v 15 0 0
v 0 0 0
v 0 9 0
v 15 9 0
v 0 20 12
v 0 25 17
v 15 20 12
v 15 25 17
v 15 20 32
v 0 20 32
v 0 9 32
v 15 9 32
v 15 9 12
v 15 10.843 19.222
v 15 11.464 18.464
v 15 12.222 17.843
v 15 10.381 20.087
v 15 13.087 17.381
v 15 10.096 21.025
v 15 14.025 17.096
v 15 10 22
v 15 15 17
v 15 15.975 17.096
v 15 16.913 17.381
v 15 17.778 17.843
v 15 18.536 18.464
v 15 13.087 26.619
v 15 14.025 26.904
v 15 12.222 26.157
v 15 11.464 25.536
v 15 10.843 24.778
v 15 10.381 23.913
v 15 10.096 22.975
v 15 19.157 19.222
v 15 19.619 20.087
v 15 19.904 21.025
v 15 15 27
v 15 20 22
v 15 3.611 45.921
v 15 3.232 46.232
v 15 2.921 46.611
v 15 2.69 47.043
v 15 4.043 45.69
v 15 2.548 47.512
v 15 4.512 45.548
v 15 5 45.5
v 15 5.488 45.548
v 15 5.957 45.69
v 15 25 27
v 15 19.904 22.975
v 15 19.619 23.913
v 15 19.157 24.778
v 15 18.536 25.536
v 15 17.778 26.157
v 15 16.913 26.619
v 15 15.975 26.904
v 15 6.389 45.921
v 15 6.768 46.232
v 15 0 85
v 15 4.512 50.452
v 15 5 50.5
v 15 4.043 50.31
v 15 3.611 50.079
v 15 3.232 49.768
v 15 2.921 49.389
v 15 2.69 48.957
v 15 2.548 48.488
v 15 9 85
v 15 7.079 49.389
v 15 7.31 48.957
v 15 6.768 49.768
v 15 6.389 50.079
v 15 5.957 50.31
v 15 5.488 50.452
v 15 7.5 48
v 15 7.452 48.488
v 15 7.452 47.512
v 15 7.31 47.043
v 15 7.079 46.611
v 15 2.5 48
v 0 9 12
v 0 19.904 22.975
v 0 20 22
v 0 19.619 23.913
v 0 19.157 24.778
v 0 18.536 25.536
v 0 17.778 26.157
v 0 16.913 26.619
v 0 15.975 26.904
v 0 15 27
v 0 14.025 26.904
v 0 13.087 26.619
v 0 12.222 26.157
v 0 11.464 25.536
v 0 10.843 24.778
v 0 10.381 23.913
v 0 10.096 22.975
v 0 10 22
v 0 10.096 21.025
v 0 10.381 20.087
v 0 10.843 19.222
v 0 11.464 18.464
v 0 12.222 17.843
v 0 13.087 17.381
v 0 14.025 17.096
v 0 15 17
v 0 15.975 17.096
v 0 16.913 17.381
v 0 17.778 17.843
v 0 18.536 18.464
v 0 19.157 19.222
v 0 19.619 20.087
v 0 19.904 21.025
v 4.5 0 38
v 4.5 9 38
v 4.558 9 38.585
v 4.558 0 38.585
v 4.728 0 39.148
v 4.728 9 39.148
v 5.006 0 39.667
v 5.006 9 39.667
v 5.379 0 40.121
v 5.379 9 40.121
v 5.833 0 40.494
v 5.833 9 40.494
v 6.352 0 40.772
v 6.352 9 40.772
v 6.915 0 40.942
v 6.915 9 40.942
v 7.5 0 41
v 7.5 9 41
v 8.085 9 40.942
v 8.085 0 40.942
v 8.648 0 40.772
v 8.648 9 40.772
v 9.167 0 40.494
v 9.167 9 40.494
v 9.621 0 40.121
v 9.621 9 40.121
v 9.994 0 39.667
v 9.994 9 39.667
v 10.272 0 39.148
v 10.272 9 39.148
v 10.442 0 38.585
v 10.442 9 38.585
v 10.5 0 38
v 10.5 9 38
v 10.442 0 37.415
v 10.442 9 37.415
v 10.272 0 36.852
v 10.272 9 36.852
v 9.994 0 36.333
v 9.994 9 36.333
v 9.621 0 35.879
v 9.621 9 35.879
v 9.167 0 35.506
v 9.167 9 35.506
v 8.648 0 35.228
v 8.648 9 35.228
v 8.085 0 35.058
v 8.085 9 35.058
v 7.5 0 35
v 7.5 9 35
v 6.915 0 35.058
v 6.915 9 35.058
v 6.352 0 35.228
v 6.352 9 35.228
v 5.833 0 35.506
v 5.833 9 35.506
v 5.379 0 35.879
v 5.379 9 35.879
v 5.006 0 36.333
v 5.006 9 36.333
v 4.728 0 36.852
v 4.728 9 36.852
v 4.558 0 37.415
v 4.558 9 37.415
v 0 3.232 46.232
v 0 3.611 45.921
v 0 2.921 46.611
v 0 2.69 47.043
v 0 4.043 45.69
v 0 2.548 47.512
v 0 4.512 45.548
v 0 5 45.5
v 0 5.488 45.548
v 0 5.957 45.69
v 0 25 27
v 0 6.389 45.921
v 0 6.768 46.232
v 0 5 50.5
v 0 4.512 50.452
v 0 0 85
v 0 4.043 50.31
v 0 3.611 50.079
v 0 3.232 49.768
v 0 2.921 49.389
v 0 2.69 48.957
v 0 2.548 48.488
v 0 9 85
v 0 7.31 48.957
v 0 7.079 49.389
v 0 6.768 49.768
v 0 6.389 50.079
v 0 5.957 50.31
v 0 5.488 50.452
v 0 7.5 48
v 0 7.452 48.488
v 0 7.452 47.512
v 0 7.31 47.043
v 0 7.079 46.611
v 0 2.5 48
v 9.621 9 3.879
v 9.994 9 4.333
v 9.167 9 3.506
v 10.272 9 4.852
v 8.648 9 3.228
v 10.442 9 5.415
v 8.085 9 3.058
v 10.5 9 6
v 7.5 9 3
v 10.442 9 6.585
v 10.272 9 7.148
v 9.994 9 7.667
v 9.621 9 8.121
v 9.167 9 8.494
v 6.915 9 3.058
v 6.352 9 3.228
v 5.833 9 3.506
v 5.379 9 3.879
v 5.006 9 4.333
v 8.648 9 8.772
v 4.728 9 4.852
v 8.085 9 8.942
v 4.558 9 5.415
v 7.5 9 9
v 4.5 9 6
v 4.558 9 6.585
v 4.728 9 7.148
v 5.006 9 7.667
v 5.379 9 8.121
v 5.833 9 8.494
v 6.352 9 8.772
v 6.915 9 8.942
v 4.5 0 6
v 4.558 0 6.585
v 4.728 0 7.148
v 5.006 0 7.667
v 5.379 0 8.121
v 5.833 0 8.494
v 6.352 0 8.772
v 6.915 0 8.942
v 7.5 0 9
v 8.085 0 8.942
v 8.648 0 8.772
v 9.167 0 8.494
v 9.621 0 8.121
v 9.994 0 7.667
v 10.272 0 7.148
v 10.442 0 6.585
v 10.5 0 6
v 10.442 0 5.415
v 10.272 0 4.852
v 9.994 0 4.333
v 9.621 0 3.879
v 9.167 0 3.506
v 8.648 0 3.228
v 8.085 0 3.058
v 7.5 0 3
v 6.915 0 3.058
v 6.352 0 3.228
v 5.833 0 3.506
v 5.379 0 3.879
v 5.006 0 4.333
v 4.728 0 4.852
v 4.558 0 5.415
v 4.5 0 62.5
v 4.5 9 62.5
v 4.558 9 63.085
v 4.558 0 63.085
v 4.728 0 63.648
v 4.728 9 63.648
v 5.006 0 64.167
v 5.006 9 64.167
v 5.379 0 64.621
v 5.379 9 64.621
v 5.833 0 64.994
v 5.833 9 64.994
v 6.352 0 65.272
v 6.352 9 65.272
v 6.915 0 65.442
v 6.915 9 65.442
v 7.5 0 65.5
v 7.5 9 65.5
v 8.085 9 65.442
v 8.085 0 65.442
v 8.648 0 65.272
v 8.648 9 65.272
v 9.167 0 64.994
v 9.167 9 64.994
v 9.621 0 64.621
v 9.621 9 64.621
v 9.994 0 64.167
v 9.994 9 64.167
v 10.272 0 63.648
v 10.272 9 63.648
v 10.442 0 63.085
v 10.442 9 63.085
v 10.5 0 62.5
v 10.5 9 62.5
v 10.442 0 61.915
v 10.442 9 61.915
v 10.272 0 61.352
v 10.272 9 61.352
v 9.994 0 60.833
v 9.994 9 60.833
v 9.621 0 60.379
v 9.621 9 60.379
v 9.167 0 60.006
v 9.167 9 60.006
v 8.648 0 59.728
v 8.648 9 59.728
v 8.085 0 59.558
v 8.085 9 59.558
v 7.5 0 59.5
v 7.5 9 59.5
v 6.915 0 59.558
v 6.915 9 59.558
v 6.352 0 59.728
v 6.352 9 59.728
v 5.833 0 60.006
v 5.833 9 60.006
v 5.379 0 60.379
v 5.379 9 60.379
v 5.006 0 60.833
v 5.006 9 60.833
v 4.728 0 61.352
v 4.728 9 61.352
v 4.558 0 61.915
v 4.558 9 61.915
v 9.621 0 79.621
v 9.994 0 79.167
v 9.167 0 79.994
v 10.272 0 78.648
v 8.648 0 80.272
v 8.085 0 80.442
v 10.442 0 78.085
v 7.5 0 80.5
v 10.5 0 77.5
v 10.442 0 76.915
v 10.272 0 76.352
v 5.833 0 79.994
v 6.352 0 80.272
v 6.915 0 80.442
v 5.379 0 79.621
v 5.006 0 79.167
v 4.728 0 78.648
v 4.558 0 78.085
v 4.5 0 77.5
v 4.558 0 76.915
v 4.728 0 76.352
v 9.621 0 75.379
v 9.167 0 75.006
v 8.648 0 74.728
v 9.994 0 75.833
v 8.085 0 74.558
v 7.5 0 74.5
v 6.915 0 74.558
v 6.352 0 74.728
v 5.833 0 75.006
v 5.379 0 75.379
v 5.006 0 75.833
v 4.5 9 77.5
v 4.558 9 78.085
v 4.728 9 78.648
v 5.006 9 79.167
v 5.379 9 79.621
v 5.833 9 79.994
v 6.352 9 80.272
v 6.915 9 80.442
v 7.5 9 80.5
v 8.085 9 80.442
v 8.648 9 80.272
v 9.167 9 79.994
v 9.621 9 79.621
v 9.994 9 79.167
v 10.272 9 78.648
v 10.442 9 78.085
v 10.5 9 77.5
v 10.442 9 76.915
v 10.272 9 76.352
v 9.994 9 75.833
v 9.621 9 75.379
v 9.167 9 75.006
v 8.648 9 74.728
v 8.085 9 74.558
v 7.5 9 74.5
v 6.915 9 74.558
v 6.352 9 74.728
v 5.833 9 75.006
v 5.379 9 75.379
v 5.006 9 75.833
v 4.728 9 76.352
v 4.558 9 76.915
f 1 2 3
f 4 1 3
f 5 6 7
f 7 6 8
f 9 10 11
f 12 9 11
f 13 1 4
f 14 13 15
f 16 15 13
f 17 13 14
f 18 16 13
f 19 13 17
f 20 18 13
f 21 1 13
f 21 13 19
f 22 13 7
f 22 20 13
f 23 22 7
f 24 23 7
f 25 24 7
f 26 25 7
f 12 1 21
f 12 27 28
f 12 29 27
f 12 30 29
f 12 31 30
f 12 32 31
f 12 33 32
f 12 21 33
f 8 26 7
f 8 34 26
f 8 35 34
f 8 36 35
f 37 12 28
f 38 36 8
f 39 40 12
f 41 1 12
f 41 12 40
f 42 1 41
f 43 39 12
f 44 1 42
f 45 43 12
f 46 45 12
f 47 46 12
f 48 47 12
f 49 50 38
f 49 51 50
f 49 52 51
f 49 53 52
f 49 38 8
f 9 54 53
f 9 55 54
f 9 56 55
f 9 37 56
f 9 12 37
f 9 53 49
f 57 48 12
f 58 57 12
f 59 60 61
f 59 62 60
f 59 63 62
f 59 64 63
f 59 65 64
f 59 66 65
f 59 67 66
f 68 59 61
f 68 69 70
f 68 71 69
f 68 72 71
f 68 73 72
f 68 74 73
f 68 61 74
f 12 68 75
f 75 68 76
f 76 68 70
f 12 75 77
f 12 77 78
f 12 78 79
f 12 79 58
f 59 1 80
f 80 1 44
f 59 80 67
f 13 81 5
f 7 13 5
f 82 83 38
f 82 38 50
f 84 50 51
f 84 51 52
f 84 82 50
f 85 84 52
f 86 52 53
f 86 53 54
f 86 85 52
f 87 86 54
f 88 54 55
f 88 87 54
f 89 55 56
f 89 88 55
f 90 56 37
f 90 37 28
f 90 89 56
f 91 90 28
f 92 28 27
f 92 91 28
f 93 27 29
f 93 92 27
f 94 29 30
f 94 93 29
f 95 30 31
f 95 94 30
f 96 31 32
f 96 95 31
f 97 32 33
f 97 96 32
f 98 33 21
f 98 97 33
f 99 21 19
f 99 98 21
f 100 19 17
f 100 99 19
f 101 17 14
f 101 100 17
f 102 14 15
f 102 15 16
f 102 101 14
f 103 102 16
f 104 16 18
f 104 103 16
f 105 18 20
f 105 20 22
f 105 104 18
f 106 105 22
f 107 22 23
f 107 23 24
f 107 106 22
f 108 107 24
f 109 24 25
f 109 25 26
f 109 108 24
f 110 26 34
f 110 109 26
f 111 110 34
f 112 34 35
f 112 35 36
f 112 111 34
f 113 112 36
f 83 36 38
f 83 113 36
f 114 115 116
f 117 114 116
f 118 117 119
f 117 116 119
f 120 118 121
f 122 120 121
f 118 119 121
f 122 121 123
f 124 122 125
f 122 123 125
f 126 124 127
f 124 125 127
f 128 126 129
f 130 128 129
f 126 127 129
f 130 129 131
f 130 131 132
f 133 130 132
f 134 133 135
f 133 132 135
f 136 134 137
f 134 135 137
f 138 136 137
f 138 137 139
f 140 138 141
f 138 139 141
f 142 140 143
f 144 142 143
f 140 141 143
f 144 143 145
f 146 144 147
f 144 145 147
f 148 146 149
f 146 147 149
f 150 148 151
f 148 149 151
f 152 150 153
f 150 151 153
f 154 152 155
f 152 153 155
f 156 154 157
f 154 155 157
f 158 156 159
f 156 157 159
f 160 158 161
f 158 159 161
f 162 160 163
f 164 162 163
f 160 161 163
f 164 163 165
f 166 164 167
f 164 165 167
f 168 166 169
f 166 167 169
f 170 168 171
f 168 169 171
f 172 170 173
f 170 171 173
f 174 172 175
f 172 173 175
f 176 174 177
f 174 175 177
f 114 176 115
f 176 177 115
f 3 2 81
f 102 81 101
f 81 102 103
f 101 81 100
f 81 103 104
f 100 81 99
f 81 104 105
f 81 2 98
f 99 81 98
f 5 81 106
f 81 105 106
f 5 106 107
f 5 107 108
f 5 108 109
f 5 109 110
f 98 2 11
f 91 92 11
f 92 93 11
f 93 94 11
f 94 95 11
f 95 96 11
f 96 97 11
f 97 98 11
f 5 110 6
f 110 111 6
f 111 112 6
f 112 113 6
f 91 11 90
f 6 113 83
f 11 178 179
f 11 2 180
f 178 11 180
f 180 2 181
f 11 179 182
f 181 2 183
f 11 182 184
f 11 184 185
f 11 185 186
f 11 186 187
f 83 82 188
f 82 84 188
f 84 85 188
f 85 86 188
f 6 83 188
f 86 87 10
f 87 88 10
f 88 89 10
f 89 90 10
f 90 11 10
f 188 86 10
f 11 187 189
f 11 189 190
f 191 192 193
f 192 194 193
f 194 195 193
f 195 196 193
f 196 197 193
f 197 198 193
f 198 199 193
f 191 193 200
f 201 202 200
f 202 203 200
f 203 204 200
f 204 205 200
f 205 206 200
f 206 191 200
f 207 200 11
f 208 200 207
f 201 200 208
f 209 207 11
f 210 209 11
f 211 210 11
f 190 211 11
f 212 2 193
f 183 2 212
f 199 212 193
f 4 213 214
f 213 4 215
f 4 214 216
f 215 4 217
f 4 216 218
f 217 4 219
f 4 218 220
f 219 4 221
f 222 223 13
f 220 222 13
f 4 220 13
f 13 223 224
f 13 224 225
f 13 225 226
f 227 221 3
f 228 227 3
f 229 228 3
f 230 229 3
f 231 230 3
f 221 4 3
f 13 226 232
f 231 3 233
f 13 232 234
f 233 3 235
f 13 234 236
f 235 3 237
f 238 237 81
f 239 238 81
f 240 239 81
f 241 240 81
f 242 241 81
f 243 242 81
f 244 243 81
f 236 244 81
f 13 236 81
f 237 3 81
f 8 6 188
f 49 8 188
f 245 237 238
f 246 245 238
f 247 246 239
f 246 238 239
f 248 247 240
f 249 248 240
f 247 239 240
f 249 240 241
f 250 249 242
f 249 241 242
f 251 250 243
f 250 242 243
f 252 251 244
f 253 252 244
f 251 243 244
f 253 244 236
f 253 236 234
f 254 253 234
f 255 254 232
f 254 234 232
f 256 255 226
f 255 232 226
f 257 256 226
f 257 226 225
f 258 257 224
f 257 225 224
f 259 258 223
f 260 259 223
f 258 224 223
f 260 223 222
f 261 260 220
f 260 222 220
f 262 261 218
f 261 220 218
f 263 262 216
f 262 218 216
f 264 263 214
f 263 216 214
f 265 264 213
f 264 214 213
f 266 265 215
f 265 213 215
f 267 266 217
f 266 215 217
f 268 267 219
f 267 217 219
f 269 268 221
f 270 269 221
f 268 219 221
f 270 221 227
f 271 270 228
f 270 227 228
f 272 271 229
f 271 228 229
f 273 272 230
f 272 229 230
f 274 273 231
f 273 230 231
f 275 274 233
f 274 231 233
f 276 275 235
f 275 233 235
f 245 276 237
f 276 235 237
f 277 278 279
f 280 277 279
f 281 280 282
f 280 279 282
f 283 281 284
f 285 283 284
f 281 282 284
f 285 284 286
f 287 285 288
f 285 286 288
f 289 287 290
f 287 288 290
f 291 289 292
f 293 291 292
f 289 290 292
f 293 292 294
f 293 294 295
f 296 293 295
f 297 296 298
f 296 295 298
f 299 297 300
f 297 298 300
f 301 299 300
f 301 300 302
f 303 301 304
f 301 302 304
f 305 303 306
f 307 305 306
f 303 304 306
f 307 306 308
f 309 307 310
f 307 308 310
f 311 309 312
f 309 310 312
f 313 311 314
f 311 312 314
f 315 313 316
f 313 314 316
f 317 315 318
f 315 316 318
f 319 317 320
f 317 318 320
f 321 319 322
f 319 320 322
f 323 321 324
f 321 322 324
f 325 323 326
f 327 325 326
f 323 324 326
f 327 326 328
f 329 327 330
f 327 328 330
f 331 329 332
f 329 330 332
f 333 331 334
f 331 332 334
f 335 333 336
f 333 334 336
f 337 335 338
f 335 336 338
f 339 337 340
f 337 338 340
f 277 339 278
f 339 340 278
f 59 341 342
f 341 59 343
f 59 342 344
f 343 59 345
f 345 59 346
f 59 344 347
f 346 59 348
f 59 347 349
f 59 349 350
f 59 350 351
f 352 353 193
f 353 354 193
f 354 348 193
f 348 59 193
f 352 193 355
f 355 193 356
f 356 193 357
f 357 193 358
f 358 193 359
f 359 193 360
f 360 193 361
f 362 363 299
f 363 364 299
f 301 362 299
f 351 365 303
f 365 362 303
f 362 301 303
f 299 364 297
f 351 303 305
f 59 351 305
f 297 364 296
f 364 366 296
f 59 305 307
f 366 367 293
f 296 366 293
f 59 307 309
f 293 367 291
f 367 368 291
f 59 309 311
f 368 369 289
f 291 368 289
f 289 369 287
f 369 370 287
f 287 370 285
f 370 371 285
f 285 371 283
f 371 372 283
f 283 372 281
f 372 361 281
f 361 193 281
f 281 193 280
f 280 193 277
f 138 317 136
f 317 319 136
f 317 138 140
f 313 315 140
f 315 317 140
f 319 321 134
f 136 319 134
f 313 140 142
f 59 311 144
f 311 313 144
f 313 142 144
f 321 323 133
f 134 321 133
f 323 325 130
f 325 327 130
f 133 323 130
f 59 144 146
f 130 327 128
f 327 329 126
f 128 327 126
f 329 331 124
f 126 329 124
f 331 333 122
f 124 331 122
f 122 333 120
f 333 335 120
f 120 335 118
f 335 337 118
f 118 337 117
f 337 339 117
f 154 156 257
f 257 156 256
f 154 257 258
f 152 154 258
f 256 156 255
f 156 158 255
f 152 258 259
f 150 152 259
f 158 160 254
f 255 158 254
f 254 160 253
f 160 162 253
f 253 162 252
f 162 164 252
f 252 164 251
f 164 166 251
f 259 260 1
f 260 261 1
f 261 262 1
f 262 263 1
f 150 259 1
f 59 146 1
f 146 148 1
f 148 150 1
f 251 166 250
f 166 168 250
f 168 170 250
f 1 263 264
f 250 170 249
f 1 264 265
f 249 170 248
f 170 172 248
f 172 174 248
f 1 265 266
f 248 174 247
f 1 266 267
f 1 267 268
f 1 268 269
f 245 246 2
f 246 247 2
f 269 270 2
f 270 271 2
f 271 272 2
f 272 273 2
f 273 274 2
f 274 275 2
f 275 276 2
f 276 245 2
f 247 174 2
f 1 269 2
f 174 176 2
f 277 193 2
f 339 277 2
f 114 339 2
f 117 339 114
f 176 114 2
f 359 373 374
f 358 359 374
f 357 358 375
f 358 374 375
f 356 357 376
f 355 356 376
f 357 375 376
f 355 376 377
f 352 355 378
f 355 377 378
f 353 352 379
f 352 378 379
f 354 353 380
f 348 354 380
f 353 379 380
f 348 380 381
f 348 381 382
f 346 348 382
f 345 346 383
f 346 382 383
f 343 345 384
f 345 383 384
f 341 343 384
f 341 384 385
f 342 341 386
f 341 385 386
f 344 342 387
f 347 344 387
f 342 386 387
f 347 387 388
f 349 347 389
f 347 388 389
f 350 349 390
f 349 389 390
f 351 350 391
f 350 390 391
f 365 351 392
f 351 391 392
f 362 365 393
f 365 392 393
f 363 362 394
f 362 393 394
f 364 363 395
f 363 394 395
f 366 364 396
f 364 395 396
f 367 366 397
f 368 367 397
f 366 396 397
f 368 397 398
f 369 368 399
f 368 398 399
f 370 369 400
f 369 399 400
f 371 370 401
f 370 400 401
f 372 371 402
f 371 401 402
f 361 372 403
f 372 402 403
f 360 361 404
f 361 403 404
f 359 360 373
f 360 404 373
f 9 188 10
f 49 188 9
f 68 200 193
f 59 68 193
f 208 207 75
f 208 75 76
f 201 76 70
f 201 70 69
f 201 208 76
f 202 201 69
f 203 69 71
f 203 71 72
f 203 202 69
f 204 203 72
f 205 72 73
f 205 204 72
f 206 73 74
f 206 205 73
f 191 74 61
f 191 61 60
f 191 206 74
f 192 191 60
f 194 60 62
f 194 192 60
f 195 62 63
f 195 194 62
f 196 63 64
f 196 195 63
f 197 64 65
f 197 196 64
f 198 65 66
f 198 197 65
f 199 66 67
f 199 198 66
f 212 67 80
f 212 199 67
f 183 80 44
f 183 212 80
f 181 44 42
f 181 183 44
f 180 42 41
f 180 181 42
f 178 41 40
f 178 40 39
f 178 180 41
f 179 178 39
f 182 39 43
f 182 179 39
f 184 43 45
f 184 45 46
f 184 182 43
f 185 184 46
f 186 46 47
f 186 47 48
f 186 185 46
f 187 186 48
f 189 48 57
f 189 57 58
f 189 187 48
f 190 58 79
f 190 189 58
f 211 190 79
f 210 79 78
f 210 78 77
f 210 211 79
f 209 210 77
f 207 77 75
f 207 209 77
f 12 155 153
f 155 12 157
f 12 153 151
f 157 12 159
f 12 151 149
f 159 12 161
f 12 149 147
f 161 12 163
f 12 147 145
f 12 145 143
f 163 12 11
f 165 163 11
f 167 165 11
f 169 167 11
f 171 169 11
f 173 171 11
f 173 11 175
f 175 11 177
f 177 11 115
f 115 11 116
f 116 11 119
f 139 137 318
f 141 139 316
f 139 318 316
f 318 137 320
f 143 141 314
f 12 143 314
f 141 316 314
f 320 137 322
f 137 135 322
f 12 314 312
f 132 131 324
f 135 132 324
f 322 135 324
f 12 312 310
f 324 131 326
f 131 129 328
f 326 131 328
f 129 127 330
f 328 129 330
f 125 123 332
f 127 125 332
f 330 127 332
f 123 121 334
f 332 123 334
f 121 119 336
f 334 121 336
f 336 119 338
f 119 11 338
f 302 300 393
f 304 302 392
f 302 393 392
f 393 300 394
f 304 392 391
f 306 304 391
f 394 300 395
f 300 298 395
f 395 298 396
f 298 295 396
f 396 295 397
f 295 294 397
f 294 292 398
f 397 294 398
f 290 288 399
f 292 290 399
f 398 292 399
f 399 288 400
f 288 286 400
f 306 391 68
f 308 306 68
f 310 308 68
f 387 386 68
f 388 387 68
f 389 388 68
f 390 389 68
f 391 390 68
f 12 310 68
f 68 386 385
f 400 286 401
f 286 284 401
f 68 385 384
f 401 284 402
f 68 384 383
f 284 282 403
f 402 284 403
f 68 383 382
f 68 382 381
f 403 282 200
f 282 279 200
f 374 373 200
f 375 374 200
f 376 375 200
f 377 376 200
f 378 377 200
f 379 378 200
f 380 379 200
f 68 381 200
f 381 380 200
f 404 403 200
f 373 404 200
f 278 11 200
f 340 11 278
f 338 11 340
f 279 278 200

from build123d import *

# Parameters (mm, degrees)
F0_R     = 5
F0_R_2   = 2.5
F1_DEPTH = 15
F2_SIZE  = 5
F3_R     = 3
F4_DEPTH = 9


with BuildPart() as f1:
    # F0 (on Right) → F1 (new body)
    with BuildSketch(Plane.YZ):
        Polygon((0, 85), (0, 0), (9, 0), (9, 12), (25, 12), (25, 32), (9, 32), (9, 85), align=None)
        with Locations((15, 22)):
            Circle(F0_R, mode=Mode.SUBTRACT)
        with Locations((5, 48)):
            Circle(F0_R_2, mode=Mode.SUBTRACT)
    extrude(amount=F1_DEPTH)

    # F2
    f2_edges = [f1.edges().sort_by_distance(p)[0] for p in [
        (7.5, 25, 32),
        (7.5, 25, 12),
    ]]
    chamfer(f2_edges, length=F2_SIZE)

    # F3 (on face) → F4 (cut, through all)
    with BuildSketch(Plane(origin=(0, 9, 0), x_dir=(-1, 0, 0), z_dir=(0, 1, 0))):
        with Locations((-7.5, 77.5)):
            Circle(F3_R)
        with Locations((-7.5, 62.5)):
            Circle(F3_R)
        with Locations((-7.5, 6)):
            Circle(F3_R)
        with Locations((-7.5, 38)):
            Circle(F3_R)
    extrude(amount=-F4_DEPTH, mode=Mode.SUBTRACT)


solid = f1.part
